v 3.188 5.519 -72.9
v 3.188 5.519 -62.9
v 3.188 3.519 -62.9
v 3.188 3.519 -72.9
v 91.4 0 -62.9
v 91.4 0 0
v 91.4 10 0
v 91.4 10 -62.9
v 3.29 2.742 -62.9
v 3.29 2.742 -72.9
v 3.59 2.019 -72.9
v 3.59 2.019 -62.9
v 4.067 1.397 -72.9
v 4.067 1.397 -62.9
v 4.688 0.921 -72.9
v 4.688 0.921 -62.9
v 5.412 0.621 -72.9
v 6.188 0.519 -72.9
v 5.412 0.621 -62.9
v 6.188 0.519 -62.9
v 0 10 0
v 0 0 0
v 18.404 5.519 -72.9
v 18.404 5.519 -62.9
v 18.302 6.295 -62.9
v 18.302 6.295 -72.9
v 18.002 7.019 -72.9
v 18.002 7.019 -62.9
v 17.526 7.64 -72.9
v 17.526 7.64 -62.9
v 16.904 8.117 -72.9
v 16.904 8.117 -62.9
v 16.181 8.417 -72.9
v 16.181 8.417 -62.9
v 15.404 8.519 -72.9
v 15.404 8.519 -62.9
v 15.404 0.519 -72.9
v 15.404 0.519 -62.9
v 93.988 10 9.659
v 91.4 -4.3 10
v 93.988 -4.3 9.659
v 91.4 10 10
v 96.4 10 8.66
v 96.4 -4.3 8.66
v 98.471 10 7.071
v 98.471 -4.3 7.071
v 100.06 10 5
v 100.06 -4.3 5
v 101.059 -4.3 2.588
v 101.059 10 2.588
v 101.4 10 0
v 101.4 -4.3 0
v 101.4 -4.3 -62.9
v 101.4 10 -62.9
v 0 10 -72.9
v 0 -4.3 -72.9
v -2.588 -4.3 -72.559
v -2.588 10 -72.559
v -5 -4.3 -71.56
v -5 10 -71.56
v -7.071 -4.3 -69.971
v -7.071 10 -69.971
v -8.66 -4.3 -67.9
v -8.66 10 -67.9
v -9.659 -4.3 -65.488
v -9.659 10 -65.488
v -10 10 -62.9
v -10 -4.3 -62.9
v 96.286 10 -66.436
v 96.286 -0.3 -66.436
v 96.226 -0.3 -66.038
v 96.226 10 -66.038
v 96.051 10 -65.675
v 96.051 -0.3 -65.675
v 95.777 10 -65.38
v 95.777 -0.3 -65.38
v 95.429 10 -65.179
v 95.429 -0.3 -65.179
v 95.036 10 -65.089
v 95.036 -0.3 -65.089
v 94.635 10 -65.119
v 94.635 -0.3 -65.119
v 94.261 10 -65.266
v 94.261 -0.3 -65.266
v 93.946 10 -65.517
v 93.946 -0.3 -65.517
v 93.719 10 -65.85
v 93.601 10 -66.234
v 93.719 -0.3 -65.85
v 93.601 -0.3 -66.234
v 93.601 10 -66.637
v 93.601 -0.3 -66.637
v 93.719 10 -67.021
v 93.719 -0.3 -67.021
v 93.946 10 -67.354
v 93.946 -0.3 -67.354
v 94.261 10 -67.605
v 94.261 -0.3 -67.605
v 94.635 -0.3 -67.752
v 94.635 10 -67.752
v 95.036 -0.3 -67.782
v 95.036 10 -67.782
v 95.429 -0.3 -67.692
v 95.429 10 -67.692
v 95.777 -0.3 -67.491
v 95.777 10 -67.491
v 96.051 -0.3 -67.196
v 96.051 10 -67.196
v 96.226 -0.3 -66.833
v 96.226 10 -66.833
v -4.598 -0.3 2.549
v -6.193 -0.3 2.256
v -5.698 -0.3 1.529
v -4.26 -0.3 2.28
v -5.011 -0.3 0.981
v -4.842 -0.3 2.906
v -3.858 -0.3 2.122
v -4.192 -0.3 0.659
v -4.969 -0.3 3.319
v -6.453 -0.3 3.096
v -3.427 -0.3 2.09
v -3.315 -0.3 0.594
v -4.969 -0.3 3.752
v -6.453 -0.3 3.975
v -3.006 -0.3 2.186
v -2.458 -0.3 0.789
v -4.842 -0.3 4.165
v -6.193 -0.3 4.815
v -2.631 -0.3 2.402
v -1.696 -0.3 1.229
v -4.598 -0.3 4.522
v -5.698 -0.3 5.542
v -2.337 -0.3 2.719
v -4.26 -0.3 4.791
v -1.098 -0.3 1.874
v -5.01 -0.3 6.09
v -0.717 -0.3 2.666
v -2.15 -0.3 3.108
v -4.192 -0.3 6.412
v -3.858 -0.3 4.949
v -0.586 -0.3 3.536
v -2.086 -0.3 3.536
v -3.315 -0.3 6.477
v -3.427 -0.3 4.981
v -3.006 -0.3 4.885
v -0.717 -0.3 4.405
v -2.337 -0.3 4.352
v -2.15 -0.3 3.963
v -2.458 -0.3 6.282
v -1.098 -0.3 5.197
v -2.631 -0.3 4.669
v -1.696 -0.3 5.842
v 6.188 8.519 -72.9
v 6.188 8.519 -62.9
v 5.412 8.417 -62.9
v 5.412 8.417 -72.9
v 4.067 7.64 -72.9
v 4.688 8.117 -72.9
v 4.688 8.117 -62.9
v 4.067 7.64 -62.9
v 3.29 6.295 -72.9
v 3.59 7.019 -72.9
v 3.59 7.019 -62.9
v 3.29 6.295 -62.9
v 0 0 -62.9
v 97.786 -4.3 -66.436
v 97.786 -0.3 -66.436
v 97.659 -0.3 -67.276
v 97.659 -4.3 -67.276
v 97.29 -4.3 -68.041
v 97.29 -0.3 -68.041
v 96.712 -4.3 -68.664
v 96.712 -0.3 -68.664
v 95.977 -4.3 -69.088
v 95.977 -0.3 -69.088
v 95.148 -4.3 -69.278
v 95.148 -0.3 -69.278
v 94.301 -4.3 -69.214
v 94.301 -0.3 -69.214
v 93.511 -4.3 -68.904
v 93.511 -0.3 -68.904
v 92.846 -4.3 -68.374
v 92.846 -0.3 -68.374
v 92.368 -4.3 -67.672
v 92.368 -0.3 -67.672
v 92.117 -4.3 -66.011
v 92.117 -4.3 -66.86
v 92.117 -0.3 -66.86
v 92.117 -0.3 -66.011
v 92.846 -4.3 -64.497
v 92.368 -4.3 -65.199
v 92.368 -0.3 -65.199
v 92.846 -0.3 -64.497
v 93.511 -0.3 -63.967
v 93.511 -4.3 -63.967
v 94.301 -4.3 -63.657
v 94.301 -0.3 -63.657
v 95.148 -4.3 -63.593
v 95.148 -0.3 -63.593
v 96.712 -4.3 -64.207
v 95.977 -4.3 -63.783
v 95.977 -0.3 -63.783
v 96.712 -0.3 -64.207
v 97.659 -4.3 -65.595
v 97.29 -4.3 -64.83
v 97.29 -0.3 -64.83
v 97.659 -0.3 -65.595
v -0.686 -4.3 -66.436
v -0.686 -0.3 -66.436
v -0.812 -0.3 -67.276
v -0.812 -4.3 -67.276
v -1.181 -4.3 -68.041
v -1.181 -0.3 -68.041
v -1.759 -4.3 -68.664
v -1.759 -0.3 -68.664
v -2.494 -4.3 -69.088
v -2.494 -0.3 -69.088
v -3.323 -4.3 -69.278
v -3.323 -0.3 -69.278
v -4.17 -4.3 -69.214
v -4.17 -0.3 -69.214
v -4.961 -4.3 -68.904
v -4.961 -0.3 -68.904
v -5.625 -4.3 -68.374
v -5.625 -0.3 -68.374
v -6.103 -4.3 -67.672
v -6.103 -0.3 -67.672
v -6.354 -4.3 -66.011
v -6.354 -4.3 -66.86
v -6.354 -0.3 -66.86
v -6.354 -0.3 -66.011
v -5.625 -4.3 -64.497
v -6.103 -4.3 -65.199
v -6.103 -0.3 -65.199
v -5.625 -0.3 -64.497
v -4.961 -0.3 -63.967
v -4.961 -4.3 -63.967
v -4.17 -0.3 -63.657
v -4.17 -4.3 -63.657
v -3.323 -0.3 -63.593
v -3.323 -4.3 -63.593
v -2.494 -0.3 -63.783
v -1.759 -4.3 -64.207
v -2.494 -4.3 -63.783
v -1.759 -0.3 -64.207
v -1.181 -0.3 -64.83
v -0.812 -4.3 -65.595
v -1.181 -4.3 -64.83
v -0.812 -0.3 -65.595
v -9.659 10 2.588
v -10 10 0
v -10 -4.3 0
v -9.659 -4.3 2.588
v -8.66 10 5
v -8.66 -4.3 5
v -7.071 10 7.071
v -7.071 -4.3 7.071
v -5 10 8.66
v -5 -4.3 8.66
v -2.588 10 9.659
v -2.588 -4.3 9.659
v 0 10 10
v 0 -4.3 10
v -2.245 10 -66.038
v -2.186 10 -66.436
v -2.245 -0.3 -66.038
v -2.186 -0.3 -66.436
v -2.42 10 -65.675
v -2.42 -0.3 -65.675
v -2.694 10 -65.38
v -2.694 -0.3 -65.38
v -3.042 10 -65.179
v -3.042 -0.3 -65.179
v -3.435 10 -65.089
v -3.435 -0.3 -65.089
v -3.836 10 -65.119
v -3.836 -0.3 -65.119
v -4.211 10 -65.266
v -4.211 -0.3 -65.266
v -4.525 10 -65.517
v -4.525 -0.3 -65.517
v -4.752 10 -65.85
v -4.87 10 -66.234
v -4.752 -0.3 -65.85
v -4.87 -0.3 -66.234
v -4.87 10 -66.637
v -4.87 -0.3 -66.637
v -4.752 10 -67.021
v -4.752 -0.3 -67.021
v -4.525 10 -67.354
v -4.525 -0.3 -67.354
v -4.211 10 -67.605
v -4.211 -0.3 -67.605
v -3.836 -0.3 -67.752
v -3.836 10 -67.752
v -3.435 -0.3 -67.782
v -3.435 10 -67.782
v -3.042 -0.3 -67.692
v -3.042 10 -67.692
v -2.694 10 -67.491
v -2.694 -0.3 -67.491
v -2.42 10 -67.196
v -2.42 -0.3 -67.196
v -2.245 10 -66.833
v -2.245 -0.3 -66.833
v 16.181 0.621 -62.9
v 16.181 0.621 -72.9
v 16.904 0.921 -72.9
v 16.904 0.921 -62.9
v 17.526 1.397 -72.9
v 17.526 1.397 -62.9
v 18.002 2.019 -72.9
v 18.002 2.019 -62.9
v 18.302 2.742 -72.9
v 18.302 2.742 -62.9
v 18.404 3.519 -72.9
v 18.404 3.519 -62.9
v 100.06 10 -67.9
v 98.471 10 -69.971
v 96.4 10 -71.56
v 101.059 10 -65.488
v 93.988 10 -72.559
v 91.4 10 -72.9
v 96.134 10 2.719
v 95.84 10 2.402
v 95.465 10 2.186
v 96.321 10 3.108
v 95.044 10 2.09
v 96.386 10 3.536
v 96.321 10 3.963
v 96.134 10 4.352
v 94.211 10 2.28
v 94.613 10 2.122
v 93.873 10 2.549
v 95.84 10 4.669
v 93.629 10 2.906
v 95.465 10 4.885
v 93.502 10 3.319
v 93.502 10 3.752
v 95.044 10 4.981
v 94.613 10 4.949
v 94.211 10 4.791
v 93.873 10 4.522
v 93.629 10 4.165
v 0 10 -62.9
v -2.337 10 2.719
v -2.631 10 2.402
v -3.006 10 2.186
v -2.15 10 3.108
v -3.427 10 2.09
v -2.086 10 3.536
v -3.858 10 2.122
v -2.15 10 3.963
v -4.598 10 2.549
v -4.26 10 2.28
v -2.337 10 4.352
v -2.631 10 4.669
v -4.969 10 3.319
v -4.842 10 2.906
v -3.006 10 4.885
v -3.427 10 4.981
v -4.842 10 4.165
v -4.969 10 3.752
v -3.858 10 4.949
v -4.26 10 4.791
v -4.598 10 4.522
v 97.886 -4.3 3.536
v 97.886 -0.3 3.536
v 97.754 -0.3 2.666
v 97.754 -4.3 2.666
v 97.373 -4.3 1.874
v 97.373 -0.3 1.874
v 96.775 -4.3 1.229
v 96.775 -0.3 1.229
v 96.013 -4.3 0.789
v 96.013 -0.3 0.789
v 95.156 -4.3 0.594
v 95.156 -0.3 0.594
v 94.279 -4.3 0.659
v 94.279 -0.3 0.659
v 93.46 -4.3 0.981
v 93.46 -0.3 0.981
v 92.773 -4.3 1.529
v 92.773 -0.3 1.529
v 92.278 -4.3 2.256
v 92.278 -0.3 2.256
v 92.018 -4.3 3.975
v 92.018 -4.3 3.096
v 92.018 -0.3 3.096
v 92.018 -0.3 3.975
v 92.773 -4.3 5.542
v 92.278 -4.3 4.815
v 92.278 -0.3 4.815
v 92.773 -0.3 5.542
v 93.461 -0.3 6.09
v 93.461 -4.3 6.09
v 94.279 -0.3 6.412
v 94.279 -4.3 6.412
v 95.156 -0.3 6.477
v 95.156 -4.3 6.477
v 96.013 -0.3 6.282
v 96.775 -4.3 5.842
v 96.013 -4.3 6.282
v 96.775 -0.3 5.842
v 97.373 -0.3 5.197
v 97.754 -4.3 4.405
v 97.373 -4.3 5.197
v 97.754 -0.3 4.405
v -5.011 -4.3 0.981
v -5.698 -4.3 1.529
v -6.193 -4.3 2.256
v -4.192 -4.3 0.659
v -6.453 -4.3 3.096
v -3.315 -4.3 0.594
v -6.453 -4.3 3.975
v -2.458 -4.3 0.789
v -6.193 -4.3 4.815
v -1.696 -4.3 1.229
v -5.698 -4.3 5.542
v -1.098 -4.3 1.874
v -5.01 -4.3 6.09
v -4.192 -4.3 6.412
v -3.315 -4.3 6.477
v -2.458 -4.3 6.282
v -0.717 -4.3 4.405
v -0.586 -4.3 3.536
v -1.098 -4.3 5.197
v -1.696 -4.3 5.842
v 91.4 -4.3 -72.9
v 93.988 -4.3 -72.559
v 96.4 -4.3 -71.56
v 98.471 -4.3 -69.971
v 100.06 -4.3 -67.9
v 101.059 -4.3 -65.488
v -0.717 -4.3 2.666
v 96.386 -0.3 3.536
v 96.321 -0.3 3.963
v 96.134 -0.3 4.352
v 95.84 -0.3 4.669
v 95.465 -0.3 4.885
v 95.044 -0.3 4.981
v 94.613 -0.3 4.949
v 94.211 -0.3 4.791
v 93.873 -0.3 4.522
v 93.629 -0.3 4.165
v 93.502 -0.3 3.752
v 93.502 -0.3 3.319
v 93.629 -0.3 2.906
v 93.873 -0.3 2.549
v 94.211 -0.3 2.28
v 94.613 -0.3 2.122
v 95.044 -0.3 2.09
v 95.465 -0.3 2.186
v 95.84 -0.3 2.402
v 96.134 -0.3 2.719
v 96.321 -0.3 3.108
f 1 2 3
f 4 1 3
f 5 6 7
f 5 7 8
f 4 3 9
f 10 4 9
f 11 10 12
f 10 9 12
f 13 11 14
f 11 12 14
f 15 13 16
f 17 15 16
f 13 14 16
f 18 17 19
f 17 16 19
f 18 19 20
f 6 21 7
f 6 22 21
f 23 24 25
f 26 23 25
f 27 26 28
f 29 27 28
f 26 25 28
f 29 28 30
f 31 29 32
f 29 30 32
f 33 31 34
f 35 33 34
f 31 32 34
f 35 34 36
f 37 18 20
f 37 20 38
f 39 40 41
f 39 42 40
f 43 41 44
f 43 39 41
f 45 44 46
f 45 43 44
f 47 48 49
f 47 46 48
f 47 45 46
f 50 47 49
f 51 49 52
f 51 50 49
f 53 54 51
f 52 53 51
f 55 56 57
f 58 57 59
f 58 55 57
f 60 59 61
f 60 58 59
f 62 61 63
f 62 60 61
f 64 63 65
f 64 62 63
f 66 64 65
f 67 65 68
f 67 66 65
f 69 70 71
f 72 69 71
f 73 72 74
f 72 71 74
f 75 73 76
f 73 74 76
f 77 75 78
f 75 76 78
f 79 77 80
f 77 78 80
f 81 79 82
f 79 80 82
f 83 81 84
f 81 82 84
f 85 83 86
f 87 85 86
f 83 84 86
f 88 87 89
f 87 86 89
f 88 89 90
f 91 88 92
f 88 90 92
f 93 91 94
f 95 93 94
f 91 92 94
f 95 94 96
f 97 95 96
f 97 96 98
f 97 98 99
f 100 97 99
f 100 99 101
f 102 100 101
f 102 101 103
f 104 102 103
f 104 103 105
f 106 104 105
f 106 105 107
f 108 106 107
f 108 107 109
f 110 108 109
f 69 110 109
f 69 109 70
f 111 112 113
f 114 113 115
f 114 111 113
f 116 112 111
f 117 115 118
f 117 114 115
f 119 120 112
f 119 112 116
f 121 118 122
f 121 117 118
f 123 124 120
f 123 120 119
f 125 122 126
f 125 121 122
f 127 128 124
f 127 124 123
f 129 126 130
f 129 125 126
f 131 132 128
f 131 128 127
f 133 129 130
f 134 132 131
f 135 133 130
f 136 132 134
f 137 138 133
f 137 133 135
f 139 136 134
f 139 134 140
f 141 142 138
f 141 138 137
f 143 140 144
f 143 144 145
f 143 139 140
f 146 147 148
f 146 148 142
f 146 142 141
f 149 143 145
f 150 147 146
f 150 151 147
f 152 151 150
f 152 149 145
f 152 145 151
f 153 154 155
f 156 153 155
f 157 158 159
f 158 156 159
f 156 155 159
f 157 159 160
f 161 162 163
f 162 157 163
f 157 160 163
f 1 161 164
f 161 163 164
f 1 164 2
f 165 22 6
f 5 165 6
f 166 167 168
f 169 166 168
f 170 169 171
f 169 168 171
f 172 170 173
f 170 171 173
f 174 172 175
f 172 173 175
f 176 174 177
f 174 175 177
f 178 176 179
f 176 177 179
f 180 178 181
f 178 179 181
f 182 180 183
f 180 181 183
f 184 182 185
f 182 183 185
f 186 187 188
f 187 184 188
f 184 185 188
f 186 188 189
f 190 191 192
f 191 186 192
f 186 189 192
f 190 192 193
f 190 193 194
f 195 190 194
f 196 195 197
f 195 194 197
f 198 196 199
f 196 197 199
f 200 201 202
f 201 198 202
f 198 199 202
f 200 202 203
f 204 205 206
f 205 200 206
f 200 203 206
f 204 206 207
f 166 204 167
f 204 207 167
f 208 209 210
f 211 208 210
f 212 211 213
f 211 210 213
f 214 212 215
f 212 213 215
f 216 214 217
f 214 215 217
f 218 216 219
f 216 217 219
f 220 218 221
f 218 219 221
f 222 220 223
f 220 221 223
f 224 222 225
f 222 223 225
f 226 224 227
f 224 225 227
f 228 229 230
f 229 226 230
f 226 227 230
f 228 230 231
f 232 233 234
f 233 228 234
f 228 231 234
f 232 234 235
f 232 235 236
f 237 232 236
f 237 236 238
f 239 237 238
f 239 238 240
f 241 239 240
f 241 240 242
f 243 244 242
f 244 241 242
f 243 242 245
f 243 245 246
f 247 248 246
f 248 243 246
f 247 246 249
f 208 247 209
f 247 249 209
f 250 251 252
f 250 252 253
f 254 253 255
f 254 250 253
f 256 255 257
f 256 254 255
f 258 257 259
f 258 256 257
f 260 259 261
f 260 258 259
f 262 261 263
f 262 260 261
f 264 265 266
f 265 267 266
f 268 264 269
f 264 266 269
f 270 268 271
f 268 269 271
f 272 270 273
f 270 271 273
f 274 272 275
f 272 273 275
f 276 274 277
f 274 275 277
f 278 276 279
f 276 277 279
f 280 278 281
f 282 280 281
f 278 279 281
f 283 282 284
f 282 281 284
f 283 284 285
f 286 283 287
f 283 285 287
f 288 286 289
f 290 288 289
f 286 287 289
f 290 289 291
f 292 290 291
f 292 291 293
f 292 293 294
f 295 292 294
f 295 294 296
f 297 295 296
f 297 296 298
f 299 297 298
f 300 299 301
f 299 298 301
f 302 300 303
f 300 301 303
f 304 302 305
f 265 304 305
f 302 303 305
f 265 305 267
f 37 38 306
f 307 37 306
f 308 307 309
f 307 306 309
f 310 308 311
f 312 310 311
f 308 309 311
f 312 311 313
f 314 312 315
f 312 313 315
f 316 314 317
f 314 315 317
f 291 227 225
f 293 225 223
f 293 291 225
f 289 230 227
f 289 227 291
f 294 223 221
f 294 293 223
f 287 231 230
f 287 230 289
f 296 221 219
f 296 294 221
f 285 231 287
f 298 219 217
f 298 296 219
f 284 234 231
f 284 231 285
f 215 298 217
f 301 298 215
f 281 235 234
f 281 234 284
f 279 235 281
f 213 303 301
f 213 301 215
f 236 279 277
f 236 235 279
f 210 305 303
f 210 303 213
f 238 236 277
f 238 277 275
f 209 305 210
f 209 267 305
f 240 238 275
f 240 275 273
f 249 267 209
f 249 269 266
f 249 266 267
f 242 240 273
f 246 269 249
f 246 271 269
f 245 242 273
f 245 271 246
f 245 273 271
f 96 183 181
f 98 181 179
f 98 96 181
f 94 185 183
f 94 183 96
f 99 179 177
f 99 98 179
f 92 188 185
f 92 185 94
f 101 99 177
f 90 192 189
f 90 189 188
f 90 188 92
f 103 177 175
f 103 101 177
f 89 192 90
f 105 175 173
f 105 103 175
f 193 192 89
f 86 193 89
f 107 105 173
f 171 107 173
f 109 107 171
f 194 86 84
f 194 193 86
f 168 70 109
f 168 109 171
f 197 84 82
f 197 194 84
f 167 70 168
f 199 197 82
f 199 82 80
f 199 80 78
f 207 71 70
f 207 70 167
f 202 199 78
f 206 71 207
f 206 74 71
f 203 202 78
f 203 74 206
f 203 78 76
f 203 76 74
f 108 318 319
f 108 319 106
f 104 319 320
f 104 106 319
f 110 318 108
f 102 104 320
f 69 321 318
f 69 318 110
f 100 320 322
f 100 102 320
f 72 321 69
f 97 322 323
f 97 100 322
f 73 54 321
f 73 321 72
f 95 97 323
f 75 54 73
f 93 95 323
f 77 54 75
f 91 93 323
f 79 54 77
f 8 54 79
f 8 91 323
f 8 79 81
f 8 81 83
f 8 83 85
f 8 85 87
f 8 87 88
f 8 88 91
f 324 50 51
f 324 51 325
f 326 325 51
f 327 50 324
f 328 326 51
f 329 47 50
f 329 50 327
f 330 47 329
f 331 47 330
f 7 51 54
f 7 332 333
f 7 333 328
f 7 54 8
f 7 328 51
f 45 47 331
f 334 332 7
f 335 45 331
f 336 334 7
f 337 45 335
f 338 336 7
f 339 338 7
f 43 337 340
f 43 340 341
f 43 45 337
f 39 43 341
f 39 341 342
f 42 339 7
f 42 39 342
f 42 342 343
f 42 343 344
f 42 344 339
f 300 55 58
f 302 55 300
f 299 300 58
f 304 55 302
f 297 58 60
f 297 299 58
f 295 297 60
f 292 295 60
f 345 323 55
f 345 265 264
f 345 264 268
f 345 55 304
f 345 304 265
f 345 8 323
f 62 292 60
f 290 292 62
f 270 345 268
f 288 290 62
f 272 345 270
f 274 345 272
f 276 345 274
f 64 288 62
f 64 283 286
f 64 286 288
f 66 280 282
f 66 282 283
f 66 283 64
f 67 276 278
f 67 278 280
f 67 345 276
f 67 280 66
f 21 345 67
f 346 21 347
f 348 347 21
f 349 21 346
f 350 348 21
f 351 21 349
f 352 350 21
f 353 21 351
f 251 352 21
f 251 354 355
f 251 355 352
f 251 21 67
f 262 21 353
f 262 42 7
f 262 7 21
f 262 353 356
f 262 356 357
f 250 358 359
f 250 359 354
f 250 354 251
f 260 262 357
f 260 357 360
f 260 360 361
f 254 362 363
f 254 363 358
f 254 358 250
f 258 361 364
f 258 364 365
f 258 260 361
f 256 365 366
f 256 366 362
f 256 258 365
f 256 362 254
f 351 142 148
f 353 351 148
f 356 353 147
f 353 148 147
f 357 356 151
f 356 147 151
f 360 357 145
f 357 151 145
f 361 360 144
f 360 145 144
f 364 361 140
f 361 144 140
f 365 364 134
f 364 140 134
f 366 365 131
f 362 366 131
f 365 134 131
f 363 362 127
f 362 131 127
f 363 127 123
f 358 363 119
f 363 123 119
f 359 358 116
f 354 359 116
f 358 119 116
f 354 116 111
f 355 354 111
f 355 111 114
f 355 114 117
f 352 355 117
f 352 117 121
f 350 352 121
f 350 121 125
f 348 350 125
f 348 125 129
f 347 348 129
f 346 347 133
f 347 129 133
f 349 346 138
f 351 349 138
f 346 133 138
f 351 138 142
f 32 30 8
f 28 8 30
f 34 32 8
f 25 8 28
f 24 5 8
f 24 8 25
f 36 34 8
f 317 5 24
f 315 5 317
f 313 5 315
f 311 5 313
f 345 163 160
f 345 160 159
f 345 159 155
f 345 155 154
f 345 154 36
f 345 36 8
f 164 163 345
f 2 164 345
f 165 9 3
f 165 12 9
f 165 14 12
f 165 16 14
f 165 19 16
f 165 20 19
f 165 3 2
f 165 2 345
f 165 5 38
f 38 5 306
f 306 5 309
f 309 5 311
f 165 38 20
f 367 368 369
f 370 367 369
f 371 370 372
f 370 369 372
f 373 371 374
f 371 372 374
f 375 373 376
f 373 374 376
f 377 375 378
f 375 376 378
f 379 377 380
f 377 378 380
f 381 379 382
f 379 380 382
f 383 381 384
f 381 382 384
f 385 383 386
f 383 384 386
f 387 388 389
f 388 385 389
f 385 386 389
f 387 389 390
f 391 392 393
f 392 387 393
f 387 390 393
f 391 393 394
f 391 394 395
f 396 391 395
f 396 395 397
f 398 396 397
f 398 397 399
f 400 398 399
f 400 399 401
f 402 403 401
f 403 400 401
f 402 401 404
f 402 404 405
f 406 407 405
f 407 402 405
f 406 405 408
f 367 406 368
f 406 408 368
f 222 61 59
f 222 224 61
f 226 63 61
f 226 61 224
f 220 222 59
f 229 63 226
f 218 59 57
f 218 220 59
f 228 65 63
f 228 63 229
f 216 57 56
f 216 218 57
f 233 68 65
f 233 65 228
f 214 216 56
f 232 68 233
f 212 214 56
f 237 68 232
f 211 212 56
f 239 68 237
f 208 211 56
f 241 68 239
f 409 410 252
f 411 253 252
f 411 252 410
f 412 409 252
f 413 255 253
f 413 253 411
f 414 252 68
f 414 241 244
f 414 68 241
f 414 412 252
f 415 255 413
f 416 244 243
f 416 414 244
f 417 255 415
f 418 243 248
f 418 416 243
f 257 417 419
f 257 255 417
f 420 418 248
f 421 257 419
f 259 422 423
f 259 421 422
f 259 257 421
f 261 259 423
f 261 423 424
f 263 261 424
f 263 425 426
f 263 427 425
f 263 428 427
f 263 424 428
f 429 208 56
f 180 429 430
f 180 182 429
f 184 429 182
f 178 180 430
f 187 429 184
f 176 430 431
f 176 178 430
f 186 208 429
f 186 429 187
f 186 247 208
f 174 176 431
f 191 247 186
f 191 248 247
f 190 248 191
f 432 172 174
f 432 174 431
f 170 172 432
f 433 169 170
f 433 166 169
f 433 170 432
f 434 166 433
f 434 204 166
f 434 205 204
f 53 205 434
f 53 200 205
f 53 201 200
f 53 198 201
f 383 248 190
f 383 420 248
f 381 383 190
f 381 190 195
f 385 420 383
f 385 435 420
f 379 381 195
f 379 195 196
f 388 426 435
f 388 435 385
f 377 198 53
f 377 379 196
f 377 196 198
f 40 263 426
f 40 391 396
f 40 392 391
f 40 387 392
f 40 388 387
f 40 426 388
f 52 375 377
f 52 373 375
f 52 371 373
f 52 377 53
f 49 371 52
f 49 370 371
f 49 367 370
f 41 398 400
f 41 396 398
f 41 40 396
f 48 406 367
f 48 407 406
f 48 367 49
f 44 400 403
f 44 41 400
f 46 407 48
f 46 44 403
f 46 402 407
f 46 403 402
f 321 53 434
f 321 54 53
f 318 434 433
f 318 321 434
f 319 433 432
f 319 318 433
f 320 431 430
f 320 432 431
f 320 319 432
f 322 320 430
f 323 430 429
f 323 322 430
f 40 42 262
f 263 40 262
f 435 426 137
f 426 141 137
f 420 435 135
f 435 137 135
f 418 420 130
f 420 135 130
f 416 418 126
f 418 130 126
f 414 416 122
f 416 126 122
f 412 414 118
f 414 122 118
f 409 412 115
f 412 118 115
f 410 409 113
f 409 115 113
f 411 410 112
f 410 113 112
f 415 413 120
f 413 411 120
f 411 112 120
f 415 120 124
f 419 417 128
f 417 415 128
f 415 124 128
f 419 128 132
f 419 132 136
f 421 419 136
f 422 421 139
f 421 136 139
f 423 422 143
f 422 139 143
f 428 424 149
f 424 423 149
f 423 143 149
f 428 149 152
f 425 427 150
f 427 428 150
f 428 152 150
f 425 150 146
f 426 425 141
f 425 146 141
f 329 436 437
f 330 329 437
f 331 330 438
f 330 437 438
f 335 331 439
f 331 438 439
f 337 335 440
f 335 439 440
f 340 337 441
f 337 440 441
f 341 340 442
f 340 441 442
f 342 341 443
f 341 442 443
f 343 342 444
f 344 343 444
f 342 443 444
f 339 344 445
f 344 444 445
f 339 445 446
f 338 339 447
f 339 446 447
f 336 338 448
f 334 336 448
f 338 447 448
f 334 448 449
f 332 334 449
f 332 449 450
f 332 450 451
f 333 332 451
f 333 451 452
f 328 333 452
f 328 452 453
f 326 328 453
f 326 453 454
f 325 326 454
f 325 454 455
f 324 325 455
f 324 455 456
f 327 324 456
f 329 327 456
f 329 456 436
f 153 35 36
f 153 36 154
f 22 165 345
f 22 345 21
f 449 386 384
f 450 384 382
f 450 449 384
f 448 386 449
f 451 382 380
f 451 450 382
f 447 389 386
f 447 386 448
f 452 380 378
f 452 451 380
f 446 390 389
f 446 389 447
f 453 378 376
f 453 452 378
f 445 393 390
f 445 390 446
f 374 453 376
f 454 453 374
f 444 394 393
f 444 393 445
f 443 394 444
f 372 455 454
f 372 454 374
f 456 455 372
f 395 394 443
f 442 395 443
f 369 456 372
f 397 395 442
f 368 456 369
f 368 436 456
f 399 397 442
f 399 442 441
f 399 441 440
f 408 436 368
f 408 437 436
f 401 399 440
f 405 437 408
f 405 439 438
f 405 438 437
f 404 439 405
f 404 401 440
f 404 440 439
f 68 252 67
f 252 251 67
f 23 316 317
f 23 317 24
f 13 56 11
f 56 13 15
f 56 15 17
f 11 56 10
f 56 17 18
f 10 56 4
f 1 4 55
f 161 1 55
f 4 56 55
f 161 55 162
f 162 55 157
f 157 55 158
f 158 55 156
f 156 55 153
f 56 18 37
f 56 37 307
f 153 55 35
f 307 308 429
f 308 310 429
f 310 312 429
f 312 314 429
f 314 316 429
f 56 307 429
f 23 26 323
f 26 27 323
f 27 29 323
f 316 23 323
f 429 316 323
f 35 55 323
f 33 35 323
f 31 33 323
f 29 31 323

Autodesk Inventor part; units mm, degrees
ref_plane "YZ Plane" through (0, 0, 0) normal (1, 0, 0) x (0, 1, 0)
ref_plane "XZ Plane" through (0, 0, 0) normal (0, 1, 0) x (-1, 0, 0)
ref_plane "XY Plane" through (0, 0, 0) normal (0, 0, 1) x (1, 0, 0)
sketch "Sketch1" plane through (0, 0, 0) normal (0, 1, 0) x (-1, 0, 0)
  line L0 (0, 0) -> (-91.4, 0)
  line L1 (-91.4, 0) -> (-91.4, -62.9)
  line L2 (-91.4, -62.9) -> (0, -62.9)
  line L3 (0, -62.9) -> (0, 0)
  line L4 (10, 10) -> (-101.4, 10)
  line L5 (-101.4, 10) -> (-101.4, -72.9)
  line L6 (-101.4, -72.9) -> (10, -72.9)
  line L7 (10, -72.9) -> (10, 10)
  dimension "d0" = 91.4
  dimension "d1" = 62.9
  dimension "d4" = 10
extrude "Extrusion1" add sketch "Sketch1" along normal blind 10
sketch "Sketch2" plane through (0, 0, 0) normal (0, -1, 0) x (1, 0, 0)
  line L0 (101.4, 10) -> (101.4, -72.9) projected
  line L1 (101.4, -72.9) -> (-10, -72.9) projected
  line L2 (-10, -72.9) -> (-10, 10) projected
  line L3 (-10, 10) -> (101.4, 10) projected
  point P0 (0, 0)
extrude "Extrusion2" add sketch "Sketch2" along normal blind 0.3
fillet "Fillet1" radius 10 4 edges at (-10, 4.85, -72.9) (101.4, 4.85, -72.9) (101.4, 4.85, 10) (-10, 4.85, 10)
sketch "Sketch5" plane through (0, -0.3, 0) normal (0, -1, 0) x (1, 0, 0)
  arc A0 (0, 10) -> (-10, 0) centre (0, 0) ccw projected
  line L0 (-10, 0) -> (-10, -62.9) projected
  arc A1 (-10, -62.9) -> (0, -72.9) centre (0, -62.9) ccw projected
  line L1 (0, -72.9) -> (91.4, -72.9) projected
  arc A2 (91.4, -72.9) -> (101.4, -62.9) centre (91.4, -62.9) ccw projected
  line L2 (101.4, -62.9) -> (101.4, 0) projected
  arc A3 (101.4, 0) -> (91.4, 10) centre (91.4, 0) ccw projected
  line L3 (91.4, 10) -> (0, 10) projected
  line L4 (91.4, 0) -> (0, 0) projected
  line L5 (91.4, -62.9) -> (91.4, 0) projected
  line L6 (0, -62.9) -> (91.4, -62.9) projected
  line L7 (0, 0) -> (0, -62.9) projected
  line L8 (-2.5102, 4.5608) -> (-1.9699, 5.1011)
  circle A4 centre (-3.5355, 3.5355) radius 1.45
  line L9 (45.7, 0) -> (45.7, -31.45)
  line L10 (93.635, 4.1768) -> (91.995, 4.9855)
  circle A5 centre (94.9355, 3.5355) radius 1.45
  line L11 (95.8901, -65.4809) -> (96.3855, -64.9855)
  line L12 (-4.4901, -65.4809) -> (-4.9855, -64.9855)
  circle A6 centre (-3.5355, -66.4355) radius 1.35
  circle A7 centre (94.9355, -66.4355) radius 1.35
  line L13 (0, 0) -> (-2.5102, 2.5102)
  line L14 (-4.5608, 4.5608) -> (-7.0711, 7.0711)
  line L15 (91.4, 0) -> (93.9102, 2.5102)
  line L16 (95.9608, 4.5608) -> (98.4711, 7.0711)
  line L17 (91.4, -62.9) -> (93.9809, -65.4809)
  line L18 (95.8901, -67.3901) -> (98.4711, -69.9711)
  line L19 (0, -62.9) -> (-2.5809, -65.4809)
  line L20 (-4.4901, -67.3901) -> (-7.0711, -69.9711)
extrude "Extrusion3" cut sketch "Sketch5" against normal blind 16 contours A4 | A5 | A6 | A7
sketch "Sketch6" plane through (0, -0.3, 0) normal (0, -1, 0) x (1, 0, 0)
  circle A0 centre (94.9355, -66.4355) radius 1.35 projected
  circle A1 centre (94.9355, 3.5355) radius 1.45 projected
  circle A2 centre (-3.5355, -66.4355) radius 1.35 projected
  circle A3 centre (-3.5355, 3.5355) radius 1.45 projected
  arc A4 (0, 10) -> (-10, 0) centre (0, 0) ccw projected
  line L0 (-10, 0) -> (-10, -62.9) projected
  arc A5 (-10, -62.9) -> (0, -72.9) centre (0, -62.9) ccw projected
  line L1 (0, -72.9) -> (91.4, -72.9) projected
  arc A6 (91.4, -72.9) -> (101.4, -62.9) centre (91.4, -62.9) ccw projected
  line L2 (101.4, -62.9) -> (101.4, 0) projected
  arc A7 (101.4, 0) -> (91.4, 10) centre (91.4, 0) ccw projected
  line L3 (91.4, 10) -> (0, 10) projected
  circle A8 centre (-3.5355, -66.4355) radius 2.85
  circle A9 centre (-3.5355, 3.5355) radius 2.95
  circle A10 centre (94.9355, 3.5355) radius 2.95
  circle A11 centre (94.9355, -66.4355) radius 2.85
  point P0 (0, 0)
  dimension "d16" = 1.5
  dimension "d17" = 1.5
  dimension "d18" = 1.5
  dimension "d19" = 1.5
extrude "Extrusion4" add sketch "Sketch6" along normal blind 4 contours L3 A7 L2 A6 L1 A5 L0 A4
sketch "Sketch7" plane through (91.4, 10, -72.9) normal (0, 0, -1) x (-1, 0, 0)
  line L0 (88.212, -2.095) -> (88.212, -9.4812)
  line L1 (88.212, -9.4812) -> (72.9957, -9.4812)
  line L2 (72.9957, -9.4812) -> (72.9957, -2.095)
  line L3 (88.212, -2.095) -> (88.212, -3.345)
  line L4 (72.9957, -3.345) -> (72.9957, -2.095)
  line L5 (88.212, -9.4812) -> (72.9957, -9.4812)
  line L6 (72.9957, -9.4812) -> (72.9957, -1.4812)
  line L7 (72.9957, -1.4812) -> (88.212, -1.4812)
  line L8 (88.212, -1.4812) -> (88.212, -9.4812)
  point P0 (91.4, -10)
  dimension "d24" = 1.25
extrude "Extrusion5" cut sketch "Sketch7" against normal blind 44.15
fillet "Fillet2" radius 3 4 edges at (18.4043, 0.5188, -67.9) (3.188, 0.5188, -67.9) (18.4043, 8.5188, -67.9) (3.188, 8.5188, -67.9)
properties part number "Bottom"
